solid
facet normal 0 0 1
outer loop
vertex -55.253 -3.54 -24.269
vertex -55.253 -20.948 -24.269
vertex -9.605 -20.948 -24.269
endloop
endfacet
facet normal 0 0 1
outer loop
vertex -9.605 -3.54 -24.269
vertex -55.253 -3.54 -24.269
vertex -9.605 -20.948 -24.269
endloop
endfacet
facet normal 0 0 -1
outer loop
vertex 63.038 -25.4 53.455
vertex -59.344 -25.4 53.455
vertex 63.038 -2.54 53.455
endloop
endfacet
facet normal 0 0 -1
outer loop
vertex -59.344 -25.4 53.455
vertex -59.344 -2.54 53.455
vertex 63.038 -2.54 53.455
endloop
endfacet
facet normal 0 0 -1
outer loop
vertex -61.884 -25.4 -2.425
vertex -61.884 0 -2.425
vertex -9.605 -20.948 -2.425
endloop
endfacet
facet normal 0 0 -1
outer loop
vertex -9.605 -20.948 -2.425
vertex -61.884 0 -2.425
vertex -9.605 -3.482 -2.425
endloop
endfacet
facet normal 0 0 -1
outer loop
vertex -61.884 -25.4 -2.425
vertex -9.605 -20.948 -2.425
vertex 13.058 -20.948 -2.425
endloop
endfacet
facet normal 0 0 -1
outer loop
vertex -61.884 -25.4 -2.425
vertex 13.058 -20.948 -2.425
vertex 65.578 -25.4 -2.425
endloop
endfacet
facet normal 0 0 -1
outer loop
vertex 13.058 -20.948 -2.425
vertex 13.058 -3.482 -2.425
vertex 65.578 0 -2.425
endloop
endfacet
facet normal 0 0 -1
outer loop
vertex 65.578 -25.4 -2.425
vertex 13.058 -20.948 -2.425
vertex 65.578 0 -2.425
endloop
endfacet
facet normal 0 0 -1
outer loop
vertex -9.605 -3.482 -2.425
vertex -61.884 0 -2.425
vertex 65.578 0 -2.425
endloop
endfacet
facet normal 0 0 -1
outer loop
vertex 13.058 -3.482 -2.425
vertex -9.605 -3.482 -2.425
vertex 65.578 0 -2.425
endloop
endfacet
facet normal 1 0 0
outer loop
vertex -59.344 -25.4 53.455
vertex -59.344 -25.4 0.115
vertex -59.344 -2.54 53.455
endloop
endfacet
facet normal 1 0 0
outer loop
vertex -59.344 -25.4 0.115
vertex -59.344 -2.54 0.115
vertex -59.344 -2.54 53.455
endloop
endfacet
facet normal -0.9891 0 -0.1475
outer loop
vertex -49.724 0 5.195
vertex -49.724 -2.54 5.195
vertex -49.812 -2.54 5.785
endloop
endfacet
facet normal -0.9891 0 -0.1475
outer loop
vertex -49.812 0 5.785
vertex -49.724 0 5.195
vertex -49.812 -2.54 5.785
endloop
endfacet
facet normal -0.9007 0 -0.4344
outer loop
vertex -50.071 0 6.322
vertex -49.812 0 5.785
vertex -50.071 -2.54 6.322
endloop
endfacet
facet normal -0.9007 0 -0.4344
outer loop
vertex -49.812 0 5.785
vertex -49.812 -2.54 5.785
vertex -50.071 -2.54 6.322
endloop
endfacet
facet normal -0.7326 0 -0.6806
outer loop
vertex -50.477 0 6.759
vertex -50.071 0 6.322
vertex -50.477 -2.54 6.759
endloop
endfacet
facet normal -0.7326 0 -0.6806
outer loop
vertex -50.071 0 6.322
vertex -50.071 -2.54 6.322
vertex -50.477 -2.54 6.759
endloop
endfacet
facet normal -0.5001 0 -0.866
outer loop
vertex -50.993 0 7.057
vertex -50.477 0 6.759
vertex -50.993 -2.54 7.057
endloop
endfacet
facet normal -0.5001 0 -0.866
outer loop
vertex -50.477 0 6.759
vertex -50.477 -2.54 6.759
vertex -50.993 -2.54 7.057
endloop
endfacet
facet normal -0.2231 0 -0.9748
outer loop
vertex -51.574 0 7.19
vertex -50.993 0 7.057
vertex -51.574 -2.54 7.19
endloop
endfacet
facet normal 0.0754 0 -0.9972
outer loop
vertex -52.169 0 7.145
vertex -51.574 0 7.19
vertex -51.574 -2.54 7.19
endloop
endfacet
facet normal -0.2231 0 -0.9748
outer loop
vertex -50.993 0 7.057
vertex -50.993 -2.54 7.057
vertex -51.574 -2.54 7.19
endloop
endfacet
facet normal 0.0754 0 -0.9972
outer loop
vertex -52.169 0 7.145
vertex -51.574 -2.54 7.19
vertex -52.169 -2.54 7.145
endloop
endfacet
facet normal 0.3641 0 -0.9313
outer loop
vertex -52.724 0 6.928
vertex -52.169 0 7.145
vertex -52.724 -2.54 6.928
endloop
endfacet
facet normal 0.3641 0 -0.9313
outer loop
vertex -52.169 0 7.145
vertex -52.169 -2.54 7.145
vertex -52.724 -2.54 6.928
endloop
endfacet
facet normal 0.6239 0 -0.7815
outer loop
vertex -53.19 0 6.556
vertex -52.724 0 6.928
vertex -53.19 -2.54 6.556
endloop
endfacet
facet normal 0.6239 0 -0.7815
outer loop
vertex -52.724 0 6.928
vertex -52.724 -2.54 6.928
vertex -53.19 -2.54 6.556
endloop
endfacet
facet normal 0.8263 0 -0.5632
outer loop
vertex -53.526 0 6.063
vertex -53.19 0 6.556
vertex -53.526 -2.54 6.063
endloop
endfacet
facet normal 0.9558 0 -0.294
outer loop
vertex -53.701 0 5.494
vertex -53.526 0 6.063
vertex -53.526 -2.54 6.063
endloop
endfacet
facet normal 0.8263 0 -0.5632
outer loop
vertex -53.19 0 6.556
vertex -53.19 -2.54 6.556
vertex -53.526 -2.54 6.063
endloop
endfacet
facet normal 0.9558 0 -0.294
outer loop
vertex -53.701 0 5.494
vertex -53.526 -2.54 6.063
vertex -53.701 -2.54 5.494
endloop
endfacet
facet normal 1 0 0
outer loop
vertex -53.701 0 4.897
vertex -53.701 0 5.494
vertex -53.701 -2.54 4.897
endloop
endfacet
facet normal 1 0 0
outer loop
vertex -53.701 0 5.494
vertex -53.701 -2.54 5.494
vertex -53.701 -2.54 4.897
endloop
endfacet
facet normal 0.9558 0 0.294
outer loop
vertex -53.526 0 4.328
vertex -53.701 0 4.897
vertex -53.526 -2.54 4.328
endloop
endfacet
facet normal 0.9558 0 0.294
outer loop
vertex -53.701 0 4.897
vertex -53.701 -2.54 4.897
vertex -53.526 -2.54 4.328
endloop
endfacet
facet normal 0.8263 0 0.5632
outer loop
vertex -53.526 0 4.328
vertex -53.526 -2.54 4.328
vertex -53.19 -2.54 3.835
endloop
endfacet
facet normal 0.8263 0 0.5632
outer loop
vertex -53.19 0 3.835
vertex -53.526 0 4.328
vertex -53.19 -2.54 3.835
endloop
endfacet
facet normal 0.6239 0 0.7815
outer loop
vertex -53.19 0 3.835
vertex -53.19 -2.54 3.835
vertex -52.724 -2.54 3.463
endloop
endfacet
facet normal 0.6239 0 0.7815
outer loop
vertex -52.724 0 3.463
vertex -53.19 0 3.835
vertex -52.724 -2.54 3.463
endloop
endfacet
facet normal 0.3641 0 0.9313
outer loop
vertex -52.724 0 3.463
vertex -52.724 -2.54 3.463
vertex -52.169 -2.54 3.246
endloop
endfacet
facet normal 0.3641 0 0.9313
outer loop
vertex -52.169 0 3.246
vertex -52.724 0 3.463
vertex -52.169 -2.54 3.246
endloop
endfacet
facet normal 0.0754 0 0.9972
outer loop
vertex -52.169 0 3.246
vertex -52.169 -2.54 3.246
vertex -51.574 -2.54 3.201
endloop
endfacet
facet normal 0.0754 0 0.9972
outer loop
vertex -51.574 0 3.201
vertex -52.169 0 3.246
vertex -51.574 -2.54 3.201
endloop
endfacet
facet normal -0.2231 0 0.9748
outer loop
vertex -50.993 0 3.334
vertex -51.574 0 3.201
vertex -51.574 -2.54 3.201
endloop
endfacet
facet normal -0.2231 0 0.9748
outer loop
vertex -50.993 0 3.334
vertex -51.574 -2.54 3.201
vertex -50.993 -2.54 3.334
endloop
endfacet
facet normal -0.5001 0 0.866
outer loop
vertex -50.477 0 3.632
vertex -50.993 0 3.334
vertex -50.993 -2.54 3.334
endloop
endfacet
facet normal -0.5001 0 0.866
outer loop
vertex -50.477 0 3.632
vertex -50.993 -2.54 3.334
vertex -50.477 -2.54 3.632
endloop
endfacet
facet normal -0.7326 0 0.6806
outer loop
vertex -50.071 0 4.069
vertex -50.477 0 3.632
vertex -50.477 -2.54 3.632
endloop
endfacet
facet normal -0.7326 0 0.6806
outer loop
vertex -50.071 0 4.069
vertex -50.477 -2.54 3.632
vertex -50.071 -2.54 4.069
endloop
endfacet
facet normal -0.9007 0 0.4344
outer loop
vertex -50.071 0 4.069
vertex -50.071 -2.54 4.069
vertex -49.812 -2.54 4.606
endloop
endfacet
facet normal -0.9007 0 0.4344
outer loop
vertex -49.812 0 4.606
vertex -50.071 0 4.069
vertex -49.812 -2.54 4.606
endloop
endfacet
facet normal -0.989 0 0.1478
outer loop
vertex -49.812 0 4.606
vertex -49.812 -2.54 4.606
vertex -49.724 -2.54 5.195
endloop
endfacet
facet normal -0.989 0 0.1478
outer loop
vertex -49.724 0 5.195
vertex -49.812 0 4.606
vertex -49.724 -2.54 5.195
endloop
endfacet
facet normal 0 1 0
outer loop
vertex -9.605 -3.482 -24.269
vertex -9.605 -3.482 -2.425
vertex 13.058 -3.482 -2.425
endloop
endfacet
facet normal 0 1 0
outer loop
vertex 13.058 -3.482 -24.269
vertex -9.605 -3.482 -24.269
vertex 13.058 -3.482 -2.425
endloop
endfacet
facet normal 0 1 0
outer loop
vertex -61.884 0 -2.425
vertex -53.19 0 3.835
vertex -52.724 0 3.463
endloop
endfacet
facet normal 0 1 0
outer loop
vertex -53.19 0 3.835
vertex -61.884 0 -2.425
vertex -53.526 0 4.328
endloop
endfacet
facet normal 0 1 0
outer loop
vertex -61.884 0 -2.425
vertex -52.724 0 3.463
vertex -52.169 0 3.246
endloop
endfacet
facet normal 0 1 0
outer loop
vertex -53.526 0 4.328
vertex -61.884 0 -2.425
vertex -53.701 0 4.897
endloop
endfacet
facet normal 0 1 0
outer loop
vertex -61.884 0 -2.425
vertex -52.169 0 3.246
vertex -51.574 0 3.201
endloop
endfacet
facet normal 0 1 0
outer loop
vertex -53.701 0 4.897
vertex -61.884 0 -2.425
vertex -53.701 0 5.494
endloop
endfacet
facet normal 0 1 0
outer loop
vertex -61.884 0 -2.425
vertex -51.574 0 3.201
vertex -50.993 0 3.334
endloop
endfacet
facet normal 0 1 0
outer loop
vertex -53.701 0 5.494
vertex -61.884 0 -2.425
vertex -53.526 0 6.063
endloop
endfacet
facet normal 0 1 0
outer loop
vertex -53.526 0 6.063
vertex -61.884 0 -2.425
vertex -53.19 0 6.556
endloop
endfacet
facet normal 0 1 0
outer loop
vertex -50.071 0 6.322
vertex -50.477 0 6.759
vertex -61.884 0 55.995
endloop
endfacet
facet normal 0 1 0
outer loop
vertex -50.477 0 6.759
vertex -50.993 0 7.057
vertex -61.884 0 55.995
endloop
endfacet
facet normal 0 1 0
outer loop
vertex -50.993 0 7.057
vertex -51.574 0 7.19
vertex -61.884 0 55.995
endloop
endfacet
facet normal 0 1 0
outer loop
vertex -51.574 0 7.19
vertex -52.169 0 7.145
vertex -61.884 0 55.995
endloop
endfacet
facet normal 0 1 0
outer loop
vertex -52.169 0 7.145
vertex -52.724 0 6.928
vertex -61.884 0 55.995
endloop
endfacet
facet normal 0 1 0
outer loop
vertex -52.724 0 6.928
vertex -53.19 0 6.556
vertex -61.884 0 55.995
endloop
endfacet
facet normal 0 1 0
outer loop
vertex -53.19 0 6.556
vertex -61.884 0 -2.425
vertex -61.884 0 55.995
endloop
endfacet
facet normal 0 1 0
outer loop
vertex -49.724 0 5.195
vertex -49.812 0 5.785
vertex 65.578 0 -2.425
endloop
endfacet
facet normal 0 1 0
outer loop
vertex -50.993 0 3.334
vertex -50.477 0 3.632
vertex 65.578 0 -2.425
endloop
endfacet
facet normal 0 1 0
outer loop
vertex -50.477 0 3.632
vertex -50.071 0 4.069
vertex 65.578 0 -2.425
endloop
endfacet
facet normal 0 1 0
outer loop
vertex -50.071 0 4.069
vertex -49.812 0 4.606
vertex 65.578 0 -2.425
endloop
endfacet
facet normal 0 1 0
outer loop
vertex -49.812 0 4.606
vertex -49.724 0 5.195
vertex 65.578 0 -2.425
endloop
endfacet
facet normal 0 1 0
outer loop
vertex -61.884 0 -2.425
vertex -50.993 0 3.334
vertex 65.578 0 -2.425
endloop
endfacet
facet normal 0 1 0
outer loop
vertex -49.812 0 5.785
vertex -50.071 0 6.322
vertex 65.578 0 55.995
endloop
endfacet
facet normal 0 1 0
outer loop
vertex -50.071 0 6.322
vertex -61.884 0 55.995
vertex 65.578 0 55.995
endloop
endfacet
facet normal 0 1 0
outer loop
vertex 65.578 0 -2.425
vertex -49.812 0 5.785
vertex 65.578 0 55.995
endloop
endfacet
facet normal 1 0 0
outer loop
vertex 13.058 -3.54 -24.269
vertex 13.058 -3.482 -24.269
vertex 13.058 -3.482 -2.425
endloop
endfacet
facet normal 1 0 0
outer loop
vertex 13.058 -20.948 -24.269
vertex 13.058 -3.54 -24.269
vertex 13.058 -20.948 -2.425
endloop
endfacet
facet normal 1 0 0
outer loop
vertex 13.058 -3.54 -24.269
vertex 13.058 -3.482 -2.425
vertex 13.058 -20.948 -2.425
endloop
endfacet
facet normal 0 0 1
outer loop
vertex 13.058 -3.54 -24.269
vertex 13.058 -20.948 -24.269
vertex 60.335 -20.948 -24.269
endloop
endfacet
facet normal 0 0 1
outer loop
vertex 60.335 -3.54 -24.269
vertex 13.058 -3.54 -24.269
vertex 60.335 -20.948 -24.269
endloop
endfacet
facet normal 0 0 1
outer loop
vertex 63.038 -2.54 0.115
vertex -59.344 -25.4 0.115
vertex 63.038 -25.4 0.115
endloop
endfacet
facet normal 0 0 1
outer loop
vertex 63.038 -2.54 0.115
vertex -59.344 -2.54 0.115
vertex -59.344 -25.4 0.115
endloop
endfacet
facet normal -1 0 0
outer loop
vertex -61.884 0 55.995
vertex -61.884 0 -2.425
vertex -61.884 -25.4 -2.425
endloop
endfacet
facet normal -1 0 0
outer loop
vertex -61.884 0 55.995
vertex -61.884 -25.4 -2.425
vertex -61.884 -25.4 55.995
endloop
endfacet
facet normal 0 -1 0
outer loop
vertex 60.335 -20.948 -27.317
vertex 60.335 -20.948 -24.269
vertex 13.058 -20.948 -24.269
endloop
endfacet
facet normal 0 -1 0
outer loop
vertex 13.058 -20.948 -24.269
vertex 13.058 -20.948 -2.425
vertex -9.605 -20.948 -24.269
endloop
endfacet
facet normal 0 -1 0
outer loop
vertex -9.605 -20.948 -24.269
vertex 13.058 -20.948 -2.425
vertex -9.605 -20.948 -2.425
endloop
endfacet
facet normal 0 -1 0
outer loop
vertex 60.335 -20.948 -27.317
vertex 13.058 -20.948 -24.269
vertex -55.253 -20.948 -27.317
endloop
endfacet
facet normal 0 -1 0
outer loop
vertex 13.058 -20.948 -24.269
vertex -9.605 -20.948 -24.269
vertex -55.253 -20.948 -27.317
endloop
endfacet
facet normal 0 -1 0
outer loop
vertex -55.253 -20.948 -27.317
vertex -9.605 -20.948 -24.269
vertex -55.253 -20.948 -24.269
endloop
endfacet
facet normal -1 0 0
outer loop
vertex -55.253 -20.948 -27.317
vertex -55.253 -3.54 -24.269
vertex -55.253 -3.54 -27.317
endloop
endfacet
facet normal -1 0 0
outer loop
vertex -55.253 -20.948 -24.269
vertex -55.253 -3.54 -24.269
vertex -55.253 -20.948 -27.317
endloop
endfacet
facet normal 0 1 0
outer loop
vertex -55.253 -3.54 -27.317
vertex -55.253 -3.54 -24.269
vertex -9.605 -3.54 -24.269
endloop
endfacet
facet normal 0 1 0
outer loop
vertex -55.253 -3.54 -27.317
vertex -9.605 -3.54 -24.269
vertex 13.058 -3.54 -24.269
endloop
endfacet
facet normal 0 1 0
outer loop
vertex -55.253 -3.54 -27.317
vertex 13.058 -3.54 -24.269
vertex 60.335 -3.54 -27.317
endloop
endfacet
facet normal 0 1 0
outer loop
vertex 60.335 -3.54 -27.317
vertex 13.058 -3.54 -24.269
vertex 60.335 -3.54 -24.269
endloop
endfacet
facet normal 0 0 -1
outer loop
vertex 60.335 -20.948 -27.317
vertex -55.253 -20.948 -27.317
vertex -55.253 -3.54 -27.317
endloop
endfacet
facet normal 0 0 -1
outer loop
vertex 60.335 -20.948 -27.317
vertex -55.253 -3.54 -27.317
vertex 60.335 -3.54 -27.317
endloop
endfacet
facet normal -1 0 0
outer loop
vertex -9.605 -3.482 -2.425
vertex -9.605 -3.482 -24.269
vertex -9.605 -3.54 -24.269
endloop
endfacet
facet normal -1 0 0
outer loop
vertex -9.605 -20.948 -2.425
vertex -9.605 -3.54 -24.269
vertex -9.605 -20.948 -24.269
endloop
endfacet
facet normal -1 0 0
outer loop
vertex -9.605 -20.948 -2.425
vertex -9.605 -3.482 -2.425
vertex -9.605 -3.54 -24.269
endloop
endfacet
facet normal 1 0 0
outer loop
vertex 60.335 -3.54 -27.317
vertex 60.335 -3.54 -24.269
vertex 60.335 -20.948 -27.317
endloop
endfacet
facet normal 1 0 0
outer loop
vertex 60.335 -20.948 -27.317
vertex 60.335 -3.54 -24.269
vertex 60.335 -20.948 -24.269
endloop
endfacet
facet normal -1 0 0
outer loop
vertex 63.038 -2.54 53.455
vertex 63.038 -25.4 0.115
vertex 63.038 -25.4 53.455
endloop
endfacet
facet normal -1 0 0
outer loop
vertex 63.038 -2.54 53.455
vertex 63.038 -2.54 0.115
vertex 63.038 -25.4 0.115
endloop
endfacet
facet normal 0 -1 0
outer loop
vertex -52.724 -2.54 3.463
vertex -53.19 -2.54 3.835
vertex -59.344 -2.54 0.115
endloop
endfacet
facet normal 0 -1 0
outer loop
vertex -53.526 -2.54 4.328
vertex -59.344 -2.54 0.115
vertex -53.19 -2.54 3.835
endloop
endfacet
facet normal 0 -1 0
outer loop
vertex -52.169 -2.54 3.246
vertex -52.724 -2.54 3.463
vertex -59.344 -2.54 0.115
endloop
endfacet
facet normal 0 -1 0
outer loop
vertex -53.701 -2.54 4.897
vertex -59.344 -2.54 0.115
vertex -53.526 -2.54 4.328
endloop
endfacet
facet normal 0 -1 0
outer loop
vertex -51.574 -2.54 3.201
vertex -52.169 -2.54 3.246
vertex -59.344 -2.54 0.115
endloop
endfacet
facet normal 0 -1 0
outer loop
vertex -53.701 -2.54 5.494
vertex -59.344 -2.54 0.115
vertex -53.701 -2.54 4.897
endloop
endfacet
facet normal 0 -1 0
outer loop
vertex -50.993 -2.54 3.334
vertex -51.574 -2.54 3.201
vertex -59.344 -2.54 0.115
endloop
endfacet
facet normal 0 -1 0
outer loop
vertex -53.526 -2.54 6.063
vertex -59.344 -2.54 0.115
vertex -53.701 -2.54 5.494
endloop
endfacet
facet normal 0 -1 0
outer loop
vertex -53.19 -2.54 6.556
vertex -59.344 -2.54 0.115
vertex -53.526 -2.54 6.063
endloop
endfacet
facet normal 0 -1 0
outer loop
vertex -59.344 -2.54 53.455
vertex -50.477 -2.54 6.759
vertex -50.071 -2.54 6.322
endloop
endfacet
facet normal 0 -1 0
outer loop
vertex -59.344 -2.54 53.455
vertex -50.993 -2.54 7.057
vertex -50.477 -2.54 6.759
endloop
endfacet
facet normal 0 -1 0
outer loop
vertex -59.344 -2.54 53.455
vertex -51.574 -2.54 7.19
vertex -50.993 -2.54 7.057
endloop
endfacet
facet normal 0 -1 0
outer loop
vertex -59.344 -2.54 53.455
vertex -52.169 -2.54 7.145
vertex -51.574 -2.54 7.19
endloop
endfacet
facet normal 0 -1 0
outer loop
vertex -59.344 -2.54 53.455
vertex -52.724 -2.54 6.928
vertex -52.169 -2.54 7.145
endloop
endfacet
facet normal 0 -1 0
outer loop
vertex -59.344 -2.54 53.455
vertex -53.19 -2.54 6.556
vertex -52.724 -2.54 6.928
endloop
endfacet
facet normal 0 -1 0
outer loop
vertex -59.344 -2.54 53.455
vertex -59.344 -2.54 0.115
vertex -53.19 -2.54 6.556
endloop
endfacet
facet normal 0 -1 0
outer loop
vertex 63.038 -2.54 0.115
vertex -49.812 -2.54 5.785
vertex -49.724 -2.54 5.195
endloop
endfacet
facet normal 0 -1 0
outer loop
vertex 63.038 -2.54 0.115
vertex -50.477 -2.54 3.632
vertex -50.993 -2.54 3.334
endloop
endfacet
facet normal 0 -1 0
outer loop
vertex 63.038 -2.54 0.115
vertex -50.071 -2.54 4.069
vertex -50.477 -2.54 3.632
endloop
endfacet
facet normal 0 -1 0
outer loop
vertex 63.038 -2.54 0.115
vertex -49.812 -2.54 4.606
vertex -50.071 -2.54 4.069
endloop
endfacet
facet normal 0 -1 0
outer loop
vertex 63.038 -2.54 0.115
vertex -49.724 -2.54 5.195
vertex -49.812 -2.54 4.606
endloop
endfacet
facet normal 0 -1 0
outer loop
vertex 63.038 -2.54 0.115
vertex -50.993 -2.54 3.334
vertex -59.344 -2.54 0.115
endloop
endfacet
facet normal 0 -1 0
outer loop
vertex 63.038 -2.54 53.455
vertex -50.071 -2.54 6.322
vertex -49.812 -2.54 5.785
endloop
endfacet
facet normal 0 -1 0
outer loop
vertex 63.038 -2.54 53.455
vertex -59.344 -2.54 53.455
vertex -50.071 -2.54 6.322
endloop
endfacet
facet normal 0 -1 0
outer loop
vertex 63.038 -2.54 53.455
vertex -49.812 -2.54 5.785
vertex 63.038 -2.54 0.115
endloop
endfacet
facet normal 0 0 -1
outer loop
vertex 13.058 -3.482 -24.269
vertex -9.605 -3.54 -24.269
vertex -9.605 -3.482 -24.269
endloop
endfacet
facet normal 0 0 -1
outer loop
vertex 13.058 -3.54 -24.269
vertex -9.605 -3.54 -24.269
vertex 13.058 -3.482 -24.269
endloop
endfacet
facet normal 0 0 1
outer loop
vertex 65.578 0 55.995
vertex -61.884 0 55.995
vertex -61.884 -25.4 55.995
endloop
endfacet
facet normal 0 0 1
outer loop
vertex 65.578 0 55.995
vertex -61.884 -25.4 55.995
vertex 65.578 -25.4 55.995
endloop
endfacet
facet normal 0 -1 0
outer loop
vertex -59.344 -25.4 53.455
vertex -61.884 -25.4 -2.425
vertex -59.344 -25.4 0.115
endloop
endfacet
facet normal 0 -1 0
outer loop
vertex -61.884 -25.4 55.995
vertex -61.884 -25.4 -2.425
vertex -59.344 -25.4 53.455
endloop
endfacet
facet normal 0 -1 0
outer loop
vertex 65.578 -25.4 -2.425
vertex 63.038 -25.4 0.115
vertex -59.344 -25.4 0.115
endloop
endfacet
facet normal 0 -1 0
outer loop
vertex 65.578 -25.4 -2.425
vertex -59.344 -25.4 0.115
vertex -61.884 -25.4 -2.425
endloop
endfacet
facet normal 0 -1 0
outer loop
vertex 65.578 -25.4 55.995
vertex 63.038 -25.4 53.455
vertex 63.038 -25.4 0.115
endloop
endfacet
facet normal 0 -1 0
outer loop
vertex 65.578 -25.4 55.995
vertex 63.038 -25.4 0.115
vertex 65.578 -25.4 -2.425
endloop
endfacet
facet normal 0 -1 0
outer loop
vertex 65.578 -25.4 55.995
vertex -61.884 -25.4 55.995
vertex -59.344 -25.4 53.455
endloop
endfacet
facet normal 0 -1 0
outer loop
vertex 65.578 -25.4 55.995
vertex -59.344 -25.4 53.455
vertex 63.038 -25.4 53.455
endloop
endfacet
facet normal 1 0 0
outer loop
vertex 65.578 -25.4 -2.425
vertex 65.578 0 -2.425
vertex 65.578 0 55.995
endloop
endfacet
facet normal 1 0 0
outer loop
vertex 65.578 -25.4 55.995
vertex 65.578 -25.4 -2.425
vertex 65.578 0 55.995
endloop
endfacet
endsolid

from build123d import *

# Parameters (mm, degrees)
F0_W     = 127.461821
F0_H     = 58.419999
F1_DEPTH = 25.4
F2_T     = -2.54
F4_D     = 4
F5_W     = 22.663121
F5_H     = 17.466478
F6_DEPTH = 21.844
F7_W     = 47.276701
F7_H     = 17.408888
F7_W_2   = 45.647759
F7_W_3   = 22.663121
F8_DEPTH = 3.048


with BuildPart() as f1:
    # F0 (on Front) → F1 (new body)
    with BuildSketch(Plane.XZ):
        with Locations((1.847274, 26.785453)):
            Rectangle(F0_W, F0_H)
    extrude(amount=F1_DEPTH)

    # F2
    f2_openings = [f1.faces().sort_by_distance(p)[0] for p in [
        (1.847275, -25.4, 26.785454),
    ]]
    offset(amount=F2_T, openings=f2_openings)

    # F4 (through all)
    with Locations(Plane(origin=(0, 0, 0), x_dir=(-1, 0, 0), z_dir=(0, 1, 0))):
        with Locations((51.723637, 5.195455)):
            Hole(F4_D / 2)

    # F5 (on face) → F6 (join)
    with BuildSketch(Plane(origin=(0, 0, -2.424546), x_dir=(1, 0, 0), z_dir=(0, 0, -1))):
        with Locations((1.726462, 12.215246)):
            Rectangle(F5_W, F5_H)
    extrude(amount=F6_DEPTH)

    # F7 (on face) → F8 (join)
    with BuildSketch(Plane(origin=(0, 0, -24.268546), x_dir=(1, 0, 0), z_dir=(0, 0, -1))):
        with Locations((36.696372, 12.244041)):
            Rectangle(F7_W, F7_H)
        with Locations((-32.428978, 12.244041)):
            Rectangle(F7_W_2, F7_H)
        with Locations((1.726462, 12.244041)):
            Rectangle(F7_W_3, F7_H)
    extrude(amount=F8_DEPTH)


solid = f1.part
